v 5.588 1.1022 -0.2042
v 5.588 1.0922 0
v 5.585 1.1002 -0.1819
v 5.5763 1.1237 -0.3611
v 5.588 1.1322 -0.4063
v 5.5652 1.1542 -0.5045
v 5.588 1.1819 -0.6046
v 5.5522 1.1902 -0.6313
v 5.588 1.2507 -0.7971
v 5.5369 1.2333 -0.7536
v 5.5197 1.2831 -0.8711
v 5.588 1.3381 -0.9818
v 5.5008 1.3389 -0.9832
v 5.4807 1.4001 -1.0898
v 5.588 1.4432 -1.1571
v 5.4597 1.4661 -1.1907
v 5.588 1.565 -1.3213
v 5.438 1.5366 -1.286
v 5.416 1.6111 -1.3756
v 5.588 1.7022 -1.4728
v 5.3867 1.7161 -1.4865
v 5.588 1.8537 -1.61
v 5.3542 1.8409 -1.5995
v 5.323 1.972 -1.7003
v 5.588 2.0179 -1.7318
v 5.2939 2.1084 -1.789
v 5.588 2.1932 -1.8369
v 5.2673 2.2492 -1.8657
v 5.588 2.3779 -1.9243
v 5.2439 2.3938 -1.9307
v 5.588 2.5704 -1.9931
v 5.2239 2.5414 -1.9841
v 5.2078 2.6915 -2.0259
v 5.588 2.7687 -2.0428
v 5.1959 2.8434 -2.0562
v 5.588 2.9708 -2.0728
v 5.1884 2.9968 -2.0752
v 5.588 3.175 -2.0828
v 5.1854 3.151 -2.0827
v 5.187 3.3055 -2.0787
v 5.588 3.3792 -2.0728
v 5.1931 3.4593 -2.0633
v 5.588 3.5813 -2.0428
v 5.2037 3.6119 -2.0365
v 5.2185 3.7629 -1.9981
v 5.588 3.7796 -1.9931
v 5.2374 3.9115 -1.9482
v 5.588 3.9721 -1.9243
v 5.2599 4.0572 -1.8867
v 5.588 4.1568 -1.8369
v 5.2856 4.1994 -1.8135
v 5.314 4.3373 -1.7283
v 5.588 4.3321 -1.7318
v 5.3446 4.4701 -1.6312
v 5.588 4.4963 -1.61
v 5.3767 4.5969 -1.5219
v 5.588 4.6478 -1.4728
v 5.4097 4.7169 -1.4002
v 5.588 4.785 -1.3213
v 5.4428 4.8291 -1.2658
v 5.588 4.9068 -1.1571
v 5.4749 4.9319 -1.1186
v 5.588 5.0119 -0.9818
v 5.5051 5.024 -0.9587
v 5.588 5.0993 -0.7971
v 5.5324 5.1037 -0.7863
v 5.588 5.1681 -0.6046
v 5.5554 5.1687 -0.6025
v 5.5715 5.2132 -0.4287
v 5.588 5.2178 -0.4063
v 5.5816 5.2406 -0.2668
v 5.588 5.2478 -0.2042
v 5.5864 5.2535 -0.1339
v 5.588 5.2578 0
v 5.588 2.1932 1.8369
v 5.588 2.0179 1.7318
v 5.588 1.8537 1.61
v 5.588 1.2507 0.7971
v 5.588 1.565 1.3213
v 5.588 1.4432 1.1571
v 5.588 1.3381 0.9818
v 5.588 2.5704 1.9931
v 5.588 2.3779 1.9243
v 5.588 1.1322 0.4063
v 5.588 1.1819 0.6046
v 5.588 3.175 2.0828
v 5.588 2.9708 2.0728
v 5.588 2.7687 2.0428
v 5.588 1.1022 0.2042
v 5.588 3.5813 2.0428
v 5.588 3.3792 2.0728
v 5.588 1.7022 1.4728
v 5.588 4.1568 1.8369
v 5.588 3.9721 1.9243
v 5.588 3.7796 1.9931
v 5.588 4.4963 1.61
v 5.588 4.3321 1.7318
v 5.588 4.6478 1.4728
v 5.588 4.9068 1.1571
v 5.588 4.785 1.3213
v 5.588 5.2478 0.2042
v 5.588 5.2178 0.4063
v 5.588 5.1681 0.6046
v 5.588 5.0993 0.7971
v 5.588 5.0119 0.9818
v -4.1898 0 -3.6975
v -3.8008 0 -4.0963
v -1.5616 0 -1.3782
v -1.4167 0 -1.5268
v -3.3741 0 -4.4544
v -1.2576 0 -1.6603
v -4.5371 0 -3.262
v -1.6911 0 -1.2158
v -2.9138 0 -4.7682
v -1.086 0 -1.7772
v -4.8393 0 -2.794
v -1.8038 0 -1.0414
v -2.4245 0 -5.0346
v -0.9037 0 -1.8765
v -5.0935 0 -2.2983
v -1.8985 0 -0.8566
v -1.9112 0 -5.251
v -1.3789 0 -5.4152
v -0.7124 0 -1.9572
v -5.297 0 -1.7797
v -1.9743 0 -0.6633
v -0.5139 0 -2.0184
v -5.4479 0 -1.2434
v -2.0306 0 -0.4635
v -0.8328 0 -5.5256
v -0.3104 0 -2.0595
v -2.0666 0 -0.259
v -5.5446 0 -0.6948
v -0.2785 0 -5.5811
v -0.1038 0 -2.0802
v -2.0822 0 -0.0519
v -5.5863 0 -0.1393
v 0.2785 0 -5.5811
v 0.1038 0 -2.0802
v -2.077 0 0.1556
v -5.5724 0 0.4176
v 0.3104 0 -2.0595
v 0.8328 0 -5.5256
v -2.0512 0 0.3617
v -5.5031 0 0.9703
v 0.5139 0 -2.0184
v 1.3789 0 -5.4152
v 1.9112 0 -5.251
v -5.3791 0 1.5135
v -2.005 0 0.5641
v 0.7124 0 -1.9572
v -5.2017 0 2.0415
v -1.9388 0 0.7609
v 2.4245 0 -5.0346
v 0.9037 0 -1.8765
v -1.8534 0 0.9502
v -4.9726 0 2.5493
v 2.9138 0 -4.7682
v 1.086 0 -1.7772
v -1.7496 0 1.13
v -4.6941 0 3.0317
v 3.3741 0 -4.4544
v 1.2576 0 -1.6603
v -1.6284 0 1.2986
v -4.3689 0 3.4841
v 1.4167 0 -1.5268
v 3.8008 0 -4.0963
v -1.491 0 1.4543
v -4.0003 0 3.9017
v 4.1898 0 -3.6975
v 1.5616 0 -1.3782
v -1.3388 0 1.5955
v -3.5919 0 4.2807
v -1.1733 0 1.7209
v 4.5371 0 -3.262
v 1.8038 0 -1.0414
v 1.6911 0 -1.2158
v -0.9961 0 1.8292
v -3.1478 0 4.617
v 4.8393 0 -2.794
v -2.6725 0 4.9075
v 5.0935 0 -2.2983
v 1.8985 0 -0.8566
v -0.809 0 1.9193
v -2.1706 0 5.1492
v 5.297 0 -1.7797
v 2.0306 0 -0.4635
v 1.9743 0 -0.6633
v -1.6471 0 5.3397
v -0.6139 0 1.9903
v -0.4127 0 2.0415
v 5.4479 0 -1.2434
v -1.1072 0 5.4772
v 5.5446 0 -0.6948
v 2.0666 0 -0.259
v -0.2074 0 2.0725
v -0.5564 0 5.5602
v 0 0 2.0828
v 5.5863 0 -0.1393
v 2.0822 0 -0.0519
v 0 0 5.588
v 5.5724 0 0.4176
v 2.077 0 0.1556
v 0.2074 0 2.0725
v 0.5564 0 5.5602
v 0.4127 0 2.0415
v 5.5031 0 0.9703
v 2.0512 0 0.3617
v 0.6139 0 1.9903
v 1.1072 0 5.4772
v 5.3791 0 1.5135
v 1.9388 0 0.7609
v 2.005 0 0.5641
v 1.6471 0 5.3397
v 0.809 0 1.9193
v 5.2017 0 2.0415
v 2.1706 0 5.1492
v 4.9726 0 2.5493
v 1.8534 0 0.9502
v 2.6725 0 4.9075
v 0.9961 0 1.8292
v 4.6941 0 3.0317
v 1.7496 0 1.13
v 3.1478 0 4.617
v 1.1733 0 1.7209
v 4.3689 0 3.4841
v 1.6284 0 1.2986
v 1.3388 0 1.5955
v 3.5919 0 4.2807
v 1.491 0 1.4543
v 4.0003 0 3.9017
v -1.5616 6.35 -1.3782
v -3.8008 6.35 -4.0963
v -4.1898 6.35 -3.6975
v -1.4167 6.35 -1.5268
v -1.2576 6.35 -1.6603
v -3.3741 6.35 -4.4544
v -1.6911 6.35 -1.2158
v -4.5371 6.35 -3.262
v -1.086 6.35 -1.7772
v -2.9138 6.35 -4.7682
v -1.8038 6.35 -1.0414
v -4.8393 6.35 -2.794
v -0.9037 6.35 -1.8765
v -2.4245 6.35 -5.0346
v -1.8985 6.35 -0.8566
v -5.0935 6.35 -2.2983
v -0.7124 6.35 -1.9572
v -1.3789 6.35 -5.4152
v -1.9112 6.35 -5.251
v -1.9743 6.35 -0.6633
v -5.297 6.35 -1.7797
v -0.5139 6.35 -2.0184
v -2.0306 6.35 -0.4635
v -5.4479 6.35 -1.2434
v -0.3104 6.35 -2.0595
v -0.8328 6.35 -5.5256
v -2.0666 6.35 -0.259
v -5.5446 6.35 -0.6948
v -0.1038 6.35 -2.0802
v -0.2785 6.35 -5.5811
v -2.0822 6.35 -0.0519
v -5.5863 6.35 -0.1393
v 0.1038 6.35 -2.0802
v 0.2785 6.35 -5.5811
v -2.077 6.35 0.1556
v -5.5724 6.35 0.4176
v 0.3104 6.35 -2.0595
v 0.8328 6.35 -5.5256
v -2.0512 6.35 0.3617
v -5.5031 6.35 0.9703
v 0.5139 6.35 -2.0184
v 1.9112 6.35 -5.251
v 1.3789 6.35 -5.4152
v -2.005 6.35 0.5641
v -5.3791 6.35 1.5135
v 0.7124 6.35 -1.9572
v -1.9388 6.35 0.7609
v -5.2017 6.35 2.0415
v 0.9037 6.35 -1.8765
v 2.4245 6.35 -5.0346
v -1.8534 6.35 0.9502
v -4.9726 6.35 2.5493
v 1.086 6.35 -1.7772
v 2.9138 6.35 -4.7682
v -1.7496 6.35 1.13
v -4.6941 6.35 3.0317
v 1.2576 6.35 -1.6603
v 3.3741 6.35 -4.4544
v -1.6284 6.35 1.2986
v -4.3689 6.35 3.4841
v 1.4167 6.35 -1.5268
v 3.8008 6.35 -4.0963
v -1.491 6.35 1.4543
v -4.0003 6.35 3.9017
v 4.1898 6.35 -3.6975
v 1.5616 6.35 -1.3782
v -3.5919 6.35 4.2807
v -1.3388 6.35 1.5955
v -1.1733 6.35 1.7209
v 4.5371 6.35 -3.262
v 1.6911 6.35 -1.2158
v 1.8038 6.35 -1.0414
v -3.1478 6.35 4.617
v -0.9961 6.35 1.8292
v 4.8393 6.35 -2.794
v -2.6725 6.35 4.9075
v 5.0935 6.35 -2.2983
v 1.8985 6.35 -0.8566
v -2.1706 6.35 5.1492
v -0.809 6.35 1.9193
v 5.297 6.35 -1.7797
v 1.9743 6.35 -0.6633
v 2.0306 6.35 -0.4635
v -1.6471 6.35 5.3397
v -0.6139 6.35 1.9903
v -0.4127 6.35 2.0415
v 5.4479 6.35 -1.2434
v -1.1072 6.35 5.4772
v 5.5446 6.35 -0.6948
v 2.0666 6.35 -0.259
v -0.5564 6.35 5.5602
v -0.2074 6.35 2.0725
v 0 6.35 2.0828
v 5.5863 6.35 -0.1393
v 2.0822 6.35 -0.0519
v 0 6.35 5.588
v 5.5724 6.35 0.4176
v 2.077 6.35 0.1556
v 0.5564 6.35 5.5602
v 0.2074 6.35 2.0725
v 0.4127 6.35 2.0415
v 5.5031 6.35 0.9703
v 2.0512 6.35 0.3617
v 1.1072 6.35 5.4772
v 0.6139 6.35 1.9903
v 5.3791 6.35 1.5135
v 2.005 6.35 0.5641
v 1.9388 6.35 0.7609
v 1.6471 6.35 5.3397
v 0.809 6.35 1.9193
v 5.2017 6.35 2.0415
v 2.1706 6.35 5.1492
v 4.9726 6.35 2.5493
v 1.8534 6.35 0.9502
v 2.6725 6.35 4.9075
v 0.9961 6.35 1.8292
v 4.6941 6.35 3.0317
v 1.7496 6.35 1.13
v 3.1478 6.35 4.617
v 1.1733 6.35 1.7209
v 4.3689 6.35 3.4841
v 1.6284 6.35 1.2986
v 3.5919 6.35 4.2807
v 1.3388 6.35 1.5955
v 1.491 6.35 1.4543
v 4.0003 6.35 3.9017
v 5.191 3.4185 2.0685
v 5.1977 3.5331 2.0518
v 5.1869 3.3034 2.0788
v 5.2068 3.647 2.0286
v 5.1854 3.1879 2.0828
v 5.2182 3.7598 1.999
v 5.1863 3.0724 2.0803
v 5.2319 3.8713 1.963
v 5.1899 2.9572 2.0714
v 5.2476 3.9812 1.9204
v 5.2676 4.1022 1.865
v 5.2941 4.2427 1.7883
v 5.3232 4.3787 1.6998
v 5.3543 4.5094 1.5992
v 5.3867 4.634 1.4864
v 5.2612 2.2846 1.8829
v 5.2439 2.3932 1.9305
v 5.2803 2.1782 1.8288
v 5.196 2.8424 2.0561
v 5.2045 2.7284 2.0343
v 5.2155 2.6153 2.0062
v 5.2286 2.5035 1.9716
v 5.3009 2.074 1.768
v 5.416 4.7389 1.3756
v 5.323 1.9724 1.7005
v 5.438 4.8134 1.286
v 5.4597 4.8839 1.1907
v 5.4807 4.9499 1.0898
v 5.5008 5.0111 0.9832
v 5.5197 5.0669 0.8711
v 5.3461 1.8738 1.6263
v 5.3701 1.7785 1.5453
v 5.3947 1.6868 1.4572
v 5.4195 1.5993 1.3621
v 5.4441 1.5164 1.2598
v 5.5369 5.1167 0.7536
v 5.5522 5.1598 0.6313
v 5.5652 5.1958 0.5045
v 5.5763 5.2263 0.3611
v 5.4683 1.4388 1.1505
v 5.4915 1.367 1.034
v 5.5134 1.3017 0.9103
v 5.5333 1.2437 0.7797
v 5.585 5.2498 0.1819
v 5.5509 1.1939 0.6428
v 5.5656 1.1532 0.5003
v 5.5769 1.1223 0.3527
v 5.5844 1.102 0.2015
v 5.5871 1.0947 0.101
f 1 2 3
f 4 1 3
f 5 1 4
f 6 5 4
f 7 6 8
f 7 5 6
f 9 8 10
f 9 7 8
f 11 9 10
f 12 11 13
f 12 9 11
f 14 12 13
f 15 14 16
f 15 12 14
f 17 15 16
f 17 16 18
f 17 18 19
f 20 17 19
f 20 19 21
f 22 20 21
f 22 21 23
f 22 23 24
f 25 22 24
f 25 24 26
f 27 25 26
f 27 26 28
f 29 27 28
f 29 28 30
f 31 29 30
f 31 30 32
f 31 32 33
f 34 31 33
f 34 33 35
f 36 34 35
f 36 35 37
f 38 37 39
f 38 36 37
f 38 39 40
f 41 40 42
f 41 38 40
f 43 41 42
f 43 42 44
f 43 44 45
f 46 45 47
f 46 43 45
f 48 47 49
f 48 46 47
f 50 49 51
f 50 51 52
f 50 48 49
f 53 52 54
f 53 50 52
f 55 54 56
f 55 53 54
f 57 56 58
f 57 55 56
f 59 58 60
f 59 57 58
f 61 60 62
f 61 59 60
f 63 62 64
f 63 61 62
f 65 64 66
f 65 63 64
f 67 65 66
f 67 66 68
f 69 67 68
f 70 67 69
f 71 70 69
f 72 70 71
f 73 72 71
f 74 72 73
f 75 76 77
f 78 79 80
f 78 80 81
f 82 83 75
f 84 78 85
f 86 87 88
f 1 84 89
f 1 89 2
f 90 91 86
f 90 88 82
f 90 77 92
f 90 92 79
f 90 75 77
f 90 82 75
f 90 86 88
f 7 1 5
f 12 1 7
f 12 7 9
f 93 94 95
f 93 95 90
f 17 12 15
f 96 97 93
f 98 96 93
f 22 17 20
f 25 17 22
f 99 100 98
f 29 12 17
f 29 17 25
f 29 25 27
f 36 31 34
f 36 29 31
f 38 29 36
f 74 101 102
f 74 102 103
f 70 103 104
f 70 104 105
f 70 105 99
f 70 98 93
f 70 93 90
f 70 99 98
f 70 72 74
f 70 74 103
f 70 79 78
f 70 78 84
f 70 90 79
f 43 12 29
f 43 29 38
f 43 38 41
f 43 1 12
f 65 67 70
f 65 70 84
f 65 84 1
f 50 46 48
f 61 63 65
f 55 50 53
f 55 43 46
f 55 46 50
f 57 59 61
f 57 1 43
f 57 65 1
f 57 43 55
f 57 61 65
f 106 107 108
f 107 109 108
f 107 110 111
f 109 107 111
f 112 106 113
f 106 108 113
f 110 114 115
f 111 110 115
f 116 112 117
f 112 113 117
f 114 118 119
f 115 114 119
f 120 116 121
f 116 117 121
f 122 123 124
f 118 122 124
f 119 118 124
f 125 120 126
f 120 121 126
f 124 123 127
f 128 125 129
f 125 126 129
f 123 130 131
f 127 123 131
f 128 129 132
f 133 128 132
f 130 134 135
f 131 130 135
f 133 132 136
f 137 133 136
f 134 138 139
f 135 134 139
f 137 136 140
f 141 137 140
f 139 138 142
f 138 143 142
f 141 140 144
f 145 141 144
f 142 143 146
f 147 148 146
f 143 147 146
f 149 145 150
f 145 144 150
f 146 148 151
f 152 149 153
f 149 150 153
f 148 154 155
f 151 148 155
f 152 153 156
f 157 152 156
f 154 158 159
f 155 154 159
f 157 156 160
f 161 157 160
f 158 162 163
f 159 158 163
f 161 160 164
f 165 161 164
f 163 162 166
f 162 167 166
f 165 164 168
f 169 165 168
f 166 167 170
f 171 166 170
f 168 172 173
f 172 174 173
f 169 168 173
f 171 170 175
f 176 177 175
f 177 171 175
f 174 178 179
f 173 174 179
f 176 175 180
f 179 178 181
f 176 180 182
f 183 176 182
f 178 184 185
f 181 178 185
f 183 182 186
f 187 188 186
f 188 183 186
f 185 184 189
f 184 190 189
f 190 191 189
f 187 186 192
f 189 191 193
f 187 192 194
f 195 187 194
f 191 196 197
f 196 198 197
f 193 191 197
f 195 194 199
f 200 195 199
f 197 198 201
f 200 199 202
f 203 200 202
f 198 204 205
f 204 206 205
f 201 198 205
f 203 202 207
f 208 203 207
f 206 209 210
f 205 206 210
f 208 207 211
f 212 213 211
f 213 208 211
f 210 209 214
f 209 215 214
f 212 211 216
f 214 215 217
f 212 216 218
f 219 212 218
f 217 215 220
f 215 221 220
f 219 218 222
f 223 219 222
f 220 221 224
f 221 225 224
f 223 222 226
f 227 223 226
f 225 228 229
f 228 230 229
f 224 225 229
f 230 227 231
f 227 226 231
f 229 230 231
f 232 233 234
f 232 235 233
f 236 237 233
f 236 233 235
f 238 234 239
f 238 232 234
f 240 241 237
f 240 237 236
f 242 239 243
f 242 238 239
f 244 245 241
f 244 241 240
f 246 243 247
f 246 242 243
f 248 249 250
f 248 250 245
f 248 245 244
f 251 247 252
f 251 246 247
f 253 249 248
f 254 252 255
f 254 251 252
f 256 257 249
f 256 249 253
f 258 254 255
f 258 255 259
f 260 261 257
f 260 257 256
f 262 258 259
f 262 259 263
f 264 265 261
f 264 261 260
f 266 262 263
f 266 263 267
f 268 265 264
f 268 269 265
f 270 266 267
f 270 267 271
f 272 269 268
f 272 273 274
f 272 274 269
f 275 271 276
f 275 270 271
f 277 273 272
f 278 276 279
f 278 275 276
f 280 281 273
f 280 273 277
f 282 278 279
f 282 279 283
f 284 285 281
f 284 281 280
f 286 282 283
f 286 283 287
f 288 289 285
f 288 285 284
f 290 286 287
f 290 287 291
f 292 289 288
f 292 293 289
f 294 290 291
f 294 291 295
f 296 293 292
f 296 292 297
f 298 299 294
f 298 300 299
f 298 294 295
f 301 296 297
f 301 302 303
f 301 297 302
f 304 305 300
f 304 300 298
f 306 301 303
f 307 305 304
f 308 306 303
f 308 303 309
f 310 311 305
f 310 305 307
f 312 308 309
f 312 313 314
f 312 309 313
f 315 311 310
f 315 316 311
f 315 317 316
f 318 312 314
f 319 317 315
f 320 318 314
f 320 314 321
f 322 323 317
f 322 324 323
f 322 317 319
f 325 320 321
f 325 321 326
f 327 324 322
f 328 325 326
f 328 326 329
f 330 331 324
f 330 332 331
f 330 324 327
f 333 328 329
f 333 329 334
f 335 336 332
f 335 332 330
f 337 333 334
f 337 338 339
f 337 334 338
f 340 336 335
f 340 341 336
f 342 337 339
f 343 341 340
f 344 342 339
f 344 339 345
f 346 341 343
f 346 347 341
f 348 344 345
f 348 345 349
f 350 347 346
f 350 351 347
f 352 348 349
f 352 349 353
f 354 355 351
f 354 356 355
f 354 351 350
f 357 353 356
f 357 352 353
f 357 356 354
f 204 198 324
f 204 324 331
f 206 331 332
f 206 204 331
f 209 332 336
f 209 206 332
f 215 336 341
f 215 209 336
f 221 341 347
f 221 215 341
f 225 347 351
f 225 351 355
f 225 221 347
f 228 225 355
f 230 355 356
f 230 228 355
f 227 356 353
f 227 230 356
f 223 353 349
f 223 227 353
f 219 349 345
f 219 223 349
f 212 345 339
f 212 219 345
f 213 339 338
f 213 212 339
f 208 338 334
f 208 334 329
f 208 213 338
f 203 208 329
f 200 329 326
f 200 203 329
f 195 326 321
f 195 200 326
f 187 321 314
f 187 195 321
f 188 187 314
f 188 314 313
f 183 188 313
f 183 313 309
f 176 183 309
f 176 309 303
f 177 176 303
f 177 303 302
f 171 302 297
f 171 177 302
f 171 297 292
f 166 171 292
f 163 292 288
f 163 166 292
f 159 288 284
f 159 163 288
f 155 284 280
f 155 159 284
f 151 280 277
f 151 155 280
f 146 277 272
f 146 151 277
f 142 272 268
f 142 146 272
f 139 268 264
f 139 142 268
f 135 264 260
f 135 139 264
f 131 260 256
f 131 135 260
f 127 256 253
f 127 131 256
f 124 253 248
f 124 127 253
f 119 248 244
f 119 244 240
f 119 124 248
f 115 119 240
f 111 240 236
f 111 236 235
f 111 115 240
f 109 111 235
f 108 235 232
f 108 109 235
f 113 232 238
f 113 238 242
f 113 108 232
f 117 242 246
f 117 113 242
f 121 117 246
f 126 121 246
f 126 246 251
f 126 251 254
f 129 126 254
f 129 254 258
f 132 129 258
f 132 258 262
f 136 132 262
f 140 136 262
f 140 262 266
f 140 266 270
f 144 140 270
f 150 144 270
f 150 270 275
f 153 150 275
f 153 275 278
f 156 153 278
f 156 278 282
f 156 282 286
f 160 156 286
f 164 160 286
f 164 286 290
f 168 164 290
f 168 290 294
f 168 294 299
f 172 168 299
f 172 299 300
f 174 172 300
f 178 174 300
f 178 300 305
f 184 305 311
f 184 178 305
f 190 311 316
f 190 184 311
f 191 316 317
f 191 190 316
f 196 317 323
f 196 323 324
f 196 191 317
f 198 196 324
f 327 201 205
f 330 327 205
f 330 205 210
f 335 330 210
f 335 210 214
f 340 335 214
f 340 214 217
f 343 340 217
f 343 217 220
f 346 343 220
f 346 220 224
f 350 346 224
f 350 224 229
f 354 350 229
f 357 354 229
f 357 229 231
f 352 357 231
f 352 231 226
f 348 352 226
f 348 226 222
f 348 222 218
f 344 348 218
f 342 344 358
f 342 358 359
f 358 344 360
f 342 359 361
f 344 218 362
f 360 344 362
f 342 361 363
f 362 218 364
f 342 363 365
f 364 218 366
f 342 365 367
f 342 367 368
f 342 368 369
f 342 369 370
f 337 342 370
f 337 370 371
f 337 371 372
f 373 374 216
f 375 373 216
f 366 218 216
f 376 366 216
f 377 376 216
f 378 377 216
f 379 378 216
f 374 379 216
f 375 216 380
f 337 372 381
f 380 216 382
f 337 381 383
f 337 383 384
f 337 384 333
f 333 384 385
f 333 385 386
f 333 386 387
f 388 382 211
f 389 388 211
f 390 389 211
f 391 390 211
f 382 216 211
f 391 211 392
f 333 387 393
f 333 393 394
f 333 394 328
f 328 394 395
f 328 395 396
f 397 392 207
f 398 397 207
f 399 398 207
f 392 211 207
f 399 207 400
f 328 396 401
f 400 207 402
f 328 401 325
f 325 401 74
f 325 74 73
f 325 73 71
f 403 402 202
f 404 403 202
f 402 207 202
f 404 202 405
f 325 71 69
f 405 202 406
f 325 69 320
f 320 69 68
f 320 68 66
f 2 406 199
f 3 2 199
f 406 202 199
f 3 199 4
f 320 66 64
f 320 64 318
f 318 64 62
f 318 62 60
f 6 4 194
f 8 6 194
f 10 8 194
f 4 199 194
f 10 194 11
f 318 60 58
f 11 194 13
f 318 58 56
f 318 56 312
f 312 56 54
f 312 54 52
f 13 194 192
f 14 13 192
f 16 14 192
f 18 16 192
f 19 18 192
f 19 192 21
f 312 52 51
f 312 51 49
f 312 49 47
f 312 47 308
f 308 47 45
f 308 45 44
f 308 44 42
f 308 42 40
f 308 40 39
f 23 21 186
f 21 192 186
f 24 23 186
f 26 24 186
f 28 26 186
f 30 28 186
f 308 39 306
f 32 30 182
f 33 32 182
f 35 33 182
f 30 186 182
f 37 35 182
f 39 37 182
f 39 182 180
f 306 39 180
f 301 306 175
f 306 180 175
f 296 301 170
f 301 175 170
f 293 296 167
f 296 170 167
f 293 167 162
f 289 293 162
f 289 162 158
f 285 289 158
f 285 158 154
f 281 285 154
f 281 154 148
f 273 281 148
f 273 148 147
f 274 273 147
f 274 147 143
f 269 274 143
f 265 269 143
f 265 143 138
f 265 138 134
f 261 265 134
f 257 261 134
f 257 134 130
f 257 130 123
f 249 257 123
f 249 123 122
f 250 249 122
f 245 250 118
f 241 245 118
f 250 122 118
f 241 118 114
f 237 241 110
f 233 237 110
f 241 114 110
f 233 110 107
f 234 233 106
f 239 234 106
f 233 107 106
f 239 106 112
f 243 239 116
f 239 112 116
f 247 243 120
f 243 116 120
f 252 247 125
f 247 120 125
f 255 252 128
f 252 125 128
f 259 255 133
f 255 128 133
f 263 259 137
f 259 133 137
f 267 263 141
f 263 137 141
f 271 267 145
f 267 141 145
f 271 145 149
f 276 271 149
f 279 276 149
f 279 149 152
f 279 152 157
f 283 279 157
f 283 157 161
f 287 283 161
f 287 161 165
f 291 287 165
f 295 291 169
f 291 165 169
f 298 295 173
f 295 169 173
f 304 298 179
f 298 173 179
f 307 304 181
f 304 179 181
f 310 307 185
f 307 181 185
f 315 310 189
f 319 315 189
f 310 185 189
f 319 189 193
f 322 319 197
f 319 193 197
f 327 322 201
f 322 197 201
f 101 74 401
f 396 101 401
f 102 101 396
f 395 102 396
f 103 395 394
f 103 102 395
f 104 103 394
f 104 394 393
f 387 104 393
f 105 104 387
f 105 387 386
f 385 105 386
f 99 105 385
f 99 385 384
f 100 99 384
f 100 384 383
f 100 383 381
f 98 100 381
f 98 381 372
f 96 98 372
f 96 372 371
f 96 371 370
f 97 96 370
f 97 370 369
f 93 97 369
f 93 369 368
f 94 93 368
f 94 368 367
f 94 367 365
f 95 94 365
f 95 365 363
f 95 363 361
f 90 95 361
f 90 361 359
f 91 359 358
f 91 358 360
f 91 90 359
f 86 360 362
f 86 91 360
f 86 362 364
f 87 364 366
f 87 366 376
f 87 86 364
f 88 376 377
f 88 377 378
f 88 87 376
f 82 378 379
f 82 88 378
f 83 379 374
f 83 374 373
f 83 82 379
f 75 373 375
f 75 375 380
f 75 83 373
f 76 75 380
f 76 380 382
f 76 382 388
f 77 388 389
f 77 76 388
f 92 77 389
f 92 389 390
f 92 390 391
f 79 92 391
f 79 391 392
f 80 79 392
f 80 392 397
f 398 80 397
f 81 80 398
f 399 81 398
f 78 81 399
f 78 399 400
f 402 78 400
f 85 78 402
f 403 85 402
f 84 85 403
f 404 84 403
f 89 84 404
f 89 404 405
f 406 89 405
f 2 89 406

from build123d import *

# Parameters (mm, degrees)
SKETCH1_R           = 5.588
SKETCH1_R_2         = 2.0828
BOSS_EXTRUDE1_DEPTH = 6.35
BOSS_EXTRUDE2_REACH = 16.016
SKETCH3_R           = 2.0828


with BuildPart() as part:
    # Sketch1 → Boss-Extrude1 (new body)
    with BuildSketch(Plane(origin=(0, 0, 0), x_dir=(1, 0, 0), z_dir=(0, 1, 0))):
        with Locations(Location((0, 0, 0), (0, 0, 270))):
            Circle(SKETCH1_R)
        with Locations(Location((0, 0, 0), (0, 0, 270))):
            Circle(SKETCH1_R_2, mode=Mode.SUBTRACT)
    extrude(amount=BOSS_EXTRUDE1_DEPTH)

    # Sketch3 → Boss-Extrude2 (add, up to next)
    with BuildSketch(Plane(origin=(5.588, 0, 0), x_dir=(0, 0, -1), z_dir=(1, 0, 0)), mode=Mode.PRIVATE) as boss_extrude2_sk1:
        with Locations((0, 3.175)):
            Circle(SKETCH3_R)
    boss_extrude2_tool1 = extrude(boss_extrude2_sk1.sketch, amount=-BOSS_EXTRUDE2_REACH, mode=Mode.PRIVATE) - part.part
    add(boss_extrude2_tool1.solids().sort_by_distance((5.588, 3.175, 0))[0])
    add(boss_extrude2_tool1.solids().sort_by_distance((5.588, 3.175, 0))[1])


solid = part.part
